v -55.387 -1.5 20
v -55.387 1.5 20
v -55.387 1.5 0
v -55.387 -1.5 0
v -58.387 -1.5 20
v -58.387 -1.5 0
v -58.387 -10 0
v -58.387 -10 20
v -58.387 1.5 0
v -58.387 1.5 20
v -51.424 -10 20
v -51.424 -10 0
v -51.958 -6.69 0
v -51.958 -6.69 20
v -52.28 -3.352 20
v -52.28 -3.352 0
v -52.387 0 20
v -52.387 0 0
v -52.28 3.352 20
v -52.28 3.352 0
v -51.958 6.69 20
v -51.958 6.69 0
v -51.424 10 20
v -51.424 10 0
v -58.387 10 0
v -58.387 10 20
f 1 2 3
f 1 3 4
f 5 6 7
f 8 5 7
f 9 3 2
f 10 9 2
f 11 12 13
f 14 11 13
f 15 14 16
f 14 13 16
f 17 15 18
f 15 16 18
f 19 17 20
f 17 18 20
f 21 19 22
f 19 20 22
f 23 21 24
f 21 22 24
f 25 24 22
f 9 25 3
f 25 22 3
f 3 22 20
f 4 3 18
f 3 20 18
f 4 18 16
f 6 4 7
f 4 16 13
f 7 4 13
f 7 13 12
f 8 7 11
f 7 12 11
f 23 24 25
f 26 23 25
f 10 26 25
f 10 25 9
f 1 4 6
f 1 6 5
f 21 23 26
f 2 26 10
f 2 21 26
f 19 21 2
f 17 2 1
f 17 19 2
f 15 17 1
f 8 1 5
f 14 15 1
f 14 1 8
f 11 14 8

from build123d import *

# Parameters (mm, degrees)
F1_DEPTH = 20
F2_W     = 8.5
F2_H     = 20
F3_DEPTH = 3


with BuildPart() as f1:
    # F0 (on Top) → F1 (new body)
    with BuildSketch(Plane.XY):
        with BuildLine():
            ThreePointArc((-51.423708, -10), (-52.387, 0), (-51.423708, 10))
            Line((-51.423708, 10), (-55.387, 10))
            Line((-55.387, 10), (-55.387, 0))
            Line((-55.387, 0), (-55.387, -10))
            Line((-55.387, -10), (-51.423708, -10))
        make_face()
    extrude(amount=F1_DEPTH)

    # F2 (on face) → F3 (join)
    with BuildSketch(Plane(origin=(-55.387, 0, 0), x_dir=(0, -1, 0), z_dir=(-1, 0, 0))):
        with Locations((5.75, 10)):
            Rectangle(F2_W, F2_H)
        with Locations((-5.75, 10)):
            Rectangle(F2_W, F2_H)
    extrude(amount=F3_DEPTH)


solid = f1.part
